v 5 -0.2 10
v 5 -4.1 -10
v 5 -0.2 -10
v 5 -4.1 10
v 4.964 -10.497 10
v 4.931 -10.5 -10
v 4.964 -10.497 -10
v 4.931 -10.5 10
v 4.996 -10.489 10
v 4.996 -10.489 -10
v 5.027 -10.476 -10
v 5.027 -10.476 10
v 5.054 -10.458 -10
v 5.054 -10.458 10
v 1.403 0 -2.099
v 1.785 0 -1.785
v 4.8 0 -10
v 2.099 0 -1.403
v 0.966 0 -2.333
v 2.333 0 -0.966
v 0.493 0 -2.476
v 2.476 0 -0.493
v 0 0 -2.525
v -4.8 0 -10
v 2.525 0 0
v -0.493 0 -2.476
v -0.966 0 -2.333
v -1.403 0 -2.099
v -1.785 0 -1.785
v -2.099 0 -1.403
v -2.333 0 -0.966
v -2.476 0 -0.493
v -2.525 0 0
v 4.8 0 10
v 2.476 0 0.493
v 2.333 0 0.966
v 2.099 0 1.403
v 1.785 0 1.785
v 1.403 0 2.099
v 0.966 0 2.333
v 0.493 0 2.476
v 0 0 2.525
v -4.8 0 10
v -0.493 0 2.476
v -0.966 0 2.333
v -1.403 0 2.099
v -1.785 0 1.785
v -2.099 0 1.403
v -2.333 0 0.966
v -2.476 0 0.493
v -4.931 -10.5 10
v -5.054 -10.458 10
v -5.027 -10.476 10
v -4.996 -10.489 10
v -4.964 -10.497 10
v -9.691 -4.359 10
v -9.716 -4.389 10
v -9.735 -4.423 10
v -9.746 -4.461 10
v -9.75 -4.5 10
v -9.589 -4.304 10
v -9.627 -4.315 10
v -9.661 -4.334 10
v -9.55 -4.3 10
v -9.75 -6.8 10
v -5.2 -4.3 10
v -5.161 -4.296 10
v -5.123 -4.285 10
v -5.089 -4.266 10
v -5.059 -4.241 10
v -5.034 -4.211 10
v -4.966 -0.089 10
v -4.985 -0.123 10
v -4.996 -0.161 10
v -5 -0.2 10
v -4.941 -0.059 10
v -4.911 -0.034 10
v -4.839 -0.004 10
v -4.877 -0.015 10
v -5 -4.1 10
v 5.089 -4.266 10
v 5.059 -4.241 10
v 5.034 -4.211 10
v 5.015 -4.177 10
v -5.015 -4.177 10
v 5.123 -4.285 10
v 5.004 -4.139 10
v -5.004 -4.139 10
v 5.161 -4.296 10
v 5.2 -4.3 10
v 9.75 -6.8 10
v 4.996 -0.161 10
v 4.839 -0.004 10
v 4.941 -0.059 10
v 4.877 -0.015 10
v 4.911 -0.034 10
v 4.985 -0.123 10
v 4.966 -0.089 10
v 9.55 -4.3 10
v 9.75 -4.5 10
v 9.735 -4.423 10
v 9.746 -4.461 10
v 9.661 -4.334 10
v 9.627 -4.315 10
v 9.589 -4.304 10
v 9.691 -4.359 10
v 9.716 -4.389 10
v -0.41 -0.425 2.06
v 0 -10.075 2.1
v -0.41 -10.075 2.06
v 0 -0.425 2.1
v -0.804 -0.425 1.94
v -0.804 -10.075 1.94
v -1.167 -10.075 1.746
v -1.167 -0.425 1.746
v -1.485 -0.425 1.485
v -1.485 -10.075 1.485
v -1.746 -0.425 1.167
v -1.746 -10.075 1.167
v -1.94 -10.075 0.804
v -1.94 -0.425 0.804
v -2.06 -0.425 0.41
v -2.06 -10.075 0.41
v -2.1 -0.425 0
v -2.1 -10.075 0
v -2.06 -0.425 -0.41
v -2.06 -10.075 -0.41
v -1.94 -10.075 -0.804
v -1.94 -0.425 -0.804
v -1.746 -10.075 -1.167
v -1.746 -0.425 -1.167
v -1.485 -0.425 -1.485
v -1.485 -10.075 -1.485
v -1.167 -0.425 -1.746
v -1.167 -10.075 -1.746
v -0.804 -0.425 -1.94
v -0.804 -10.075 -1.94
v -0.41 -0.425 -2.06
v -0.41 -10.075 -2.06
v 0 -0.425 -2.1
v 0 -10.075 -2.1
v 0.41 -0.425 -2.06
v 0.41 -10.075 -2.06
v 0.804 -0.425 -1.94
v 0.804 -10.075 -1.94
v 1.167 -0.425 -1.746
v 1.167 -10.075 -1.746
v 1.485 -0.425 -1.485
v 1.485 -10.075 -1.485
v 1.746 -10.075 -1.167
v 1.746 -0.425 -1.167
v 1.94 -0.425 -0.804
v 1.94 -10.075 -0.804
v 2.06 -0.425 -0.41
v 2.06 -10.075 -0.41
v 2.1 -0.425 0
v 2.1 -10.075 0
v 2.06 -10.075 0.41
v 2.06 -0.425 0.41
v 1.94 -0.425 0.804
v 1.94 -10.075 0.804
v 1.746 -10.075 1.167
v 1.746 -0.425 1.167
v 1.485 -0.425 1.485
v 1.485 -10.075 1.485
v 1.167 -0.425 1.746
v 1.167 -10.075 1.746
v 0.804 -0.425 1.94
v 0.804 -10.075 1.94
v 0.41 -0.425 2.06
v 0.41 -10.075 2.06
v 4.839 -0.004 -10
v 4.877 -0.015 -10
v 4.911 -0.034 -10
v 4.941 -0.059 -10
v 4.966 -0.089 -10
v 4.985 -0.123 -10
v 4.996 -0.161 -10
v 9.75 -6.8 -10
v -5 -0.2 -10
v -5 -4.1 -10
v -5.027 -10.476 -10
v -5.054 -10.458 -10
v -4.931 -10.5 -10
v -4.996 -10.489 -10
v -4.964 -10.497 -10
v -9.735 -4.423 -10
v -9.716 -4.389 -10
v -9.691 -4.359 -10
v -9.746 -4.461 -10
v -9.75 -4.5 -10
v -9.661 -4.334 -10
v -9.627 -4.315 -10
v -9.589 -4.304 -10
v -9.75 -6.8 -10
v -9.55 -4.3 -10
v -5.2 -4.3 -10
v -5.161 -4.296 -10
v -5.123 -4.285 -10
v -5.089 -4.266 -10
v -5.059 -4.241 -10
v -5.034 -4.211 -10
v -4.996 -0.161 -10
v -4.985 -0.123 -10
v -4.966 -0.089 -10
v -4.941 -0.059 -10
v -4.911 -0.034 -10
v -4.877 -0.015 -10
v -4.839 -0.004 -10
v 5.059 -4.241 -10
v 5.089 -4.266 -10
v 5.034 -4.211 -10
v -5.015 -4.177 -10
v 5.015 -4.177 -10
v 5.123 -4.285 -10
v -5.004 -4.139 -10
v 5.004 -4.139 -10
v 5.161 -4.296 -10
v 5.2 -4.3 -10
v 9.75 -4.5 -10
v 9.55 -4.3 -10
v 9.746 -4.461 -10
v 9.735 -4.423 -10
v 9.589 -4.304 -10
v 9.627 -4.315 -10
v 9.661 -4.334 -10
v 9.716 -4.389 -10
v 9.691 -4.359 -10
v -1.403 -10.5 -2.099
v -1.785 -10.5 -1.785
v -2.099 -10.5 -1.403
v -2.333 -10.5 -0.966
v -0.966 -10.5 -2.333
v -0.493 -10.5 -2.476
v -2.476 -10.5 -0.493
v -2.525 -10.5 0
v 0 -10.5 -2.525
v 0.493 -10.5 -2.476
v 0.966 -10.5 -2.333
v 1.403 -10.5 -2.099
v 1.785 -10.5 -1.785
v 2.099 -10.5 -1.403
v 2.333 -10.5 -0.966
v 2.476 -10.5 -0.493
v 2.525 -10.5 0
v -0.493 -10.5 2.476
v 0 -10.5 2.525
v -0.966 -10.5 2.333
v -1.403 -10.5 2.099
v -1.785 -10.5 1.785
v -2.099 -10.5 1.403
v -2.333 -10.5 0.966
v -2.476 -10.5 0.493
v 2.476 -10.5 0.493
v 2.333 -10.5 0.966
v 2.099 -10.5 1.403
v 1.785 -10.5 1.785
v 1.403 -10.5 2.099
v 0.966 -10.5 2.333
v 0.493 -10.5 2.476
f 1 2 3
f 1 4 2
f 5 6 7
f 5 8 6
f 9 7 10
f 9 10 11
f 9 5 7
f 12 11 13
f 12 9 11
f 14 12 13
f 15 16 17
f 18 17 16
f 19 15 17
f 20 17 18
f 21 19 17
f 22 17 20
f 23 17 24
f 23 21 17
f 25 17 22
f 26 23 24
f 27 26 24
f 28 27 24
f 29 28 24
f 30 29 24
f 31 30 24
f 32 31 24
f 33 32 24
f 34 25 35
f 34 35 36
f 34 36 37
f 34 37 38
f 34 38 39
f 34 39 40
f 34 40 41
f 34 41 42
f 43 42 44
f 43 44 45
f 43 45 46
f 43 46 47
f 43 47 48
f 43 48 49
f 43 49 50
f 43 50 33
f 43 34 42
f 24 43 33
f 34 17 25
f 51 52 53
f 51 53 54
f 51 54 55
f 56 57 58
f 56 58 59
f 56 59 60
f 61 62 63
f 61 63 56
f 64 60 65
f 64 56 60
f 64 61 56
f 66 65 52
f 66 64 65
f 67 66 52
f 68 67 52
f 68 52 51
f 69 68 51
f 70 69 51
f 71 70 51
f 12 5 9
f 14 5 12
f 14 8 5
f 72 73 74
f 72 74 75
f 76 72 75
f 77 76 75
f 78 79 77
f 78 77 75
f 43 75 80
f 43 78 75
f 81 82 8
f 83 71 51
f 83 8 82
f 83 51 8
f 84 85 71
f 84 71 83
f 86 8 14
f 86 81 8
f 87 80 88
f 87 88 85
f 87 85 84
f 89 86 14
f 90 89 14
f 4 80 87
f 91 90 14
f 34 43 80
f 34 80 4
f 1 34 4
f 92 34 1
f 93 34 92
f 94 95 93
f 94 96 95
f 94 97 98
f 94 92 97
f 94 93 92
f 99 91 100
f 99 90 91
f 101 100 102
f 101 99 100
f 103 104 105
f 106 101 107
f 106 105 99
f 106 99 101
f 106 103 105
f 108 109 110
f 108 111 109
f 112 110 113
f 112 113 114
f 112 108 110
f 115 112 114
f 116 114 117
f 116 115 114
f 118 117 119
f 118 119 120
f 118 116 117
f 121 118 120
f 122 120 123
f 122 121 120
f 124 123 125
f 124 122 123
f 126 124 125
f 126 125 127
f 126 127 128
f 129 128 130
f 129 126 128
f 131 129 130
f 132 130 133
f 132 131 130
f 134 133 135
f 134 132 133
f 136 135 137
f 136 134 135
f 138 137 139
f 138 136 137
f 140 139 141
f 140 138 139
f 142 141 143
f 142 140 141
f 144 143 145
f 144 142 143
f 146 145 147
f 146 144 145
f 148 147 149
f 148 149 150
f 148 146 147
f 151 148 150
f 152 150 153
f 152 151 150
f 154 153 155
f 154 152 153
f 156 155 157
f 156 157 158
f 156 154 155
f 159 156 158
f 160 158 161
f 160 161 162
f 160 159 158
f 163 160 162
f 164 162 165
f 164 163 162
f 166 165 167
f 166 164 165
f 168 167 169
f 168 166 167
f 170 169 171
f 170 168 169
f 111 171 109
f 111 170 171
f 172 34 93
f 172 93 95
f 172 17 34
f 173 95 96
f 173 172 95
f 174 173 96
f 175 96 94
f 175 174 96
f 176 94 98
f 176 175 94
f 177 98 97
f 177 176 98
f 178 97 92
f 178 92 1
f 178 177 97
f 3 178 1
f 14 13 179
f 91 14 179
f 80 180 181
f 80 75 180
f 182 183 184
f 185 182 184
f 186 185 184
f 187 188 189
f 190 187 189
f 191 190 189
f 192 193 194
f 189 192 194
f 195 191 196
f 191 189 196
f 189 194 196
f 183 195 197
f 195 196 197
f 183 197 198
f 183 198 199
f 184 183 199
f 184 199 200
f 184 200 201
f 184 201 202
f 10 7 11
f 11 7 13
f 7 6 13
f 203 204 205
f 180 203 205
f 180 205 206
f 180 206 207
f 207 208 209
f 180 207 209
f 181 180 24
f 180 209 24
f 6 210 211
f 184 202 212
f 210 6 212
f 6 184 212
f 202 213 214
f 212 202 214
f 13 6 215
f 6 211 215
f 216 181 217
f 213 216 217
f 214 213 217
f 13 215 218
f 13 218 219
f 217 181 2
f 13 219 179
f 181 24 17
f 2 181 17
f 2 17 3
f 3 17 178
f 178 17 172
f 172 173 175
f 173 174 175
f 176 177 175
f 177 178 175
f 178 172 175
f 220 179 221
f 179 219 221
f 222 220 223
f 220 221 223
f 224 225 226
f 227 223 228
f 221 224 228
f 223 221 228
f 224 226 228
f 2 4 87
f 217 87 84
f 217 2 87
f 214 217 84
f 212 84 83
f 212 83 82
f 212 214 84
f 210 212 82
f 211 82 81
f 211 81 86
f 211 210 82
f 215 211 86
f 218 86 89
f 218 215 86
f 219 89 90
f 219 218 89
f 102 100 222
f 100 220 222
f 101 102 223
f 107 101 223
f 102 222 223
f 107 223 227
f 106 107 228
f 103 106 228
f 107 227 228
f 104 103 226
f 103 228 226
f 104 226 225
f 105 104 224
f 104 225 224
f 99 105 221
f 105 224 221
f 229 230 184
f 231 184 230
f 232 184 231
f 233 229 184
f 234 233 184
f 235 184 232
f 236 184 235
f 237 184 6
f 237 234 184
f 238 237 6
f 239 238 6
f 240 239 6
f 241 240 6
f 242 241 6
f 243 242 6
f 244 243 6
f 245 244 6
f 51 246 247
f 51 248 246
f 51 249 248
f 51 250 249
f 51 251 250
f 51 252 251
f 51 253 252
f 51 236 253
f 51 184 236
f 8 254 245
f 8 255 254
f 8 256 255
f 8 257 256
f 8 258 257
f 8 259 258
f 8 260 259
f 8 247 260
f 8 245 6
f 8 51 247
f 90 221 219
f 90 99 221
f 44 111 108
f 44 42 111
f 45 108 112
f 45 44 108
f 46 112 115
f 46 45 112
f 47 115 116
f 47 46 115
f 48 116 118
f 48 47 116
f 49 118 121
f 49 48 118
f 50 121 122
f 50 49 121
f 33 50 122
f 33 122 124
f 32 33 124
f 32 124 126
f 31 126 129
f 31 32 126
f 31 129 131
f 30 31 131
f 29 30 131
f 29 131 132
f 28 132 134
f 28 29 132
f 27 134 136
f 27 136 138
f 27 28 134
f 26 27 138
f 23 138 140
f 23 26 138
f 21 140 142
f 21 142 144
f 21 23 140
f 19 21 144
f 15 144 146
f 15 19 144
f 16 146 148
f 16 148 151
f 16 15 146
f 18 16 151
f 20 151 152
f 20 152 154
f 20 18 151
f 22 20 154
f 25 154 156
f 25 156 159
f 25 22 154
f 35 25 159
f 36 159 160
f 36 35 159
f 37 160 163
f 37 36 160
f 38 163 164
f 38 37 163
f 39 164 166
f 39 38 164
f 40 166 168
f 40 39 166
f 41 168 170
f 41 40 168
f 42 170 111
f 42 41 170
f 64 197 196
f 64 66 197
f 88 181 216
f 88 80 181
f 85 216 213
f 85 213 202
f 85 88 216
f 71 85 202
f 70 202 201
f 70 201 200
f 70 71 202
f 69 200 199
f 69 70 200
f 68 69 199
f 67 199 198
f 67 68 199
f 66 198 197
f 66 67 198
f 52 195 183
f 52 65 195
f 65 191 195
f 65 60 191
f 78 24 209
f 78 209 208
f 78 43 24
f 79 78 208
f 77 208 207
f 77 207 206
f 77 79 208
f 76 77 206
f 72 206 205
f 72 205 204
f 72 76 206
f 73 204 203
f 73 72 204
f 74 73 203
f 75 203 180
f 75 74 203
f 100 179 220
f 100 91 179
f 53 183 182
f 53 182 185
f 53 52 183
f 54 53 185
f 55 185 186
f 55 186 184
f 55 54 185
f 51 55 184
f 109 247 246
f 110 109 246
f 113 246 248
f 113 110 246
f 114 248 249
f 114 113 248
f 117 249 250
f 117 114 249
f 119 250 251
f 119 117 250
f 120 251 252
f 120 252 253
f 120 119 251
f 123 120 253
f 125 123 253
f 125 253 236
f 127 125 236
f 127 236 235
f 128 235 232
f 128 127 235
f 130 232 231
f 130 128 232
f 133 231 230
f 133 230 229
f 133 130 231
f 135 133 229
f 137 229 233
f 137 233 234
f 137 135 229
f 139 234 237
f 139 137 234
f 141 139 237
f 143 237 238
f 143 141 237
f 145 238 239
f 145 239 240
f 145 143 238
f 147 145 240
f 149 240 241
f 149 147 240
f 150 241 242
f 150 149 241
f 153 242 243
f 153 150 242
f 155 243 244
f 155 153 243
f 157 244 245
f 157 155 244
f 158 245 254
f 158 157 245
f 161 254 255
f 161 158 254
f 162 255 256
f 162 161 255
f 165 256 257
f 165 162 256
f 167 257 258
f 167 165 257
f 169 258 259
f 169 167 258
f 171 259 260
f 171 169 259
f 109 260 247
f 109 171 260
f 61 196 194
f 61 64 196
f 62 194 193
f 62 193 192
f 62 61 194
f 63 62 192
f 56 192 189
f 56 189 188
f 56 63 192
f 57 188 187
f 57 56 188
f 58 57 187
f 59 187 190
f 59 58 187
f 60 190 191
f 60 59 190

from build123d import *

# Parameters (mm, degrees)
EXTRUDE_1_DEPTH = 10
FILLET_1_R      = 0.2


with BuildPart() as part:
    # Эскиз1 → Бобышка-Вытянуть1 (new body, symmetric)
    with BuildSketch(Plane.XY):
        Polygon((5, 0), (-5, 0), (-5, -4.3), (-9.75, -4.3), (-9.75, -6.8), (-5, -10.5), (5, -10.5), (9.75, -6.8), (9.75, -4.3), (5, -4.3), align=None)
    extrude(amount=EXTRUDE_1_DEPTH, both=True)

    # Эскиз4 → Отверстие обработанное метчиком M54 (revolve, cut)
    with BuildSketch(Plane(origin=(0, 0, 0), x_dir=(0, 0, 1), z_dir=(1, 0, 0))):
        Polygon((0, 0), (0, 10.5), (2.525, 10.5), (2.1, 10.075), (2.1, 0.425), (2.525, 0), align=None)
    revolve(axis=Axis((0, 6.35, 0), (0, -1, 0)), mode=Mode.SUBTRACT)

    # Скругление1
    fillet_1_edges = [part.edges().sort_by_distance(p)[0] for p in [
        (-5, 0, 0),
        (5, 0, 0),
        (5, -4.3, 0),
        (9.75, -4.3, 0),
        (5, -10.5, 0),
        (-5, -10.5, 0),
        (-9.75, -4.3, 0),
        (-5, -4.3, 0),
    ]]
    fillet(fillet_1_edges, radius=FILLET_1_R)


solid = part.part
